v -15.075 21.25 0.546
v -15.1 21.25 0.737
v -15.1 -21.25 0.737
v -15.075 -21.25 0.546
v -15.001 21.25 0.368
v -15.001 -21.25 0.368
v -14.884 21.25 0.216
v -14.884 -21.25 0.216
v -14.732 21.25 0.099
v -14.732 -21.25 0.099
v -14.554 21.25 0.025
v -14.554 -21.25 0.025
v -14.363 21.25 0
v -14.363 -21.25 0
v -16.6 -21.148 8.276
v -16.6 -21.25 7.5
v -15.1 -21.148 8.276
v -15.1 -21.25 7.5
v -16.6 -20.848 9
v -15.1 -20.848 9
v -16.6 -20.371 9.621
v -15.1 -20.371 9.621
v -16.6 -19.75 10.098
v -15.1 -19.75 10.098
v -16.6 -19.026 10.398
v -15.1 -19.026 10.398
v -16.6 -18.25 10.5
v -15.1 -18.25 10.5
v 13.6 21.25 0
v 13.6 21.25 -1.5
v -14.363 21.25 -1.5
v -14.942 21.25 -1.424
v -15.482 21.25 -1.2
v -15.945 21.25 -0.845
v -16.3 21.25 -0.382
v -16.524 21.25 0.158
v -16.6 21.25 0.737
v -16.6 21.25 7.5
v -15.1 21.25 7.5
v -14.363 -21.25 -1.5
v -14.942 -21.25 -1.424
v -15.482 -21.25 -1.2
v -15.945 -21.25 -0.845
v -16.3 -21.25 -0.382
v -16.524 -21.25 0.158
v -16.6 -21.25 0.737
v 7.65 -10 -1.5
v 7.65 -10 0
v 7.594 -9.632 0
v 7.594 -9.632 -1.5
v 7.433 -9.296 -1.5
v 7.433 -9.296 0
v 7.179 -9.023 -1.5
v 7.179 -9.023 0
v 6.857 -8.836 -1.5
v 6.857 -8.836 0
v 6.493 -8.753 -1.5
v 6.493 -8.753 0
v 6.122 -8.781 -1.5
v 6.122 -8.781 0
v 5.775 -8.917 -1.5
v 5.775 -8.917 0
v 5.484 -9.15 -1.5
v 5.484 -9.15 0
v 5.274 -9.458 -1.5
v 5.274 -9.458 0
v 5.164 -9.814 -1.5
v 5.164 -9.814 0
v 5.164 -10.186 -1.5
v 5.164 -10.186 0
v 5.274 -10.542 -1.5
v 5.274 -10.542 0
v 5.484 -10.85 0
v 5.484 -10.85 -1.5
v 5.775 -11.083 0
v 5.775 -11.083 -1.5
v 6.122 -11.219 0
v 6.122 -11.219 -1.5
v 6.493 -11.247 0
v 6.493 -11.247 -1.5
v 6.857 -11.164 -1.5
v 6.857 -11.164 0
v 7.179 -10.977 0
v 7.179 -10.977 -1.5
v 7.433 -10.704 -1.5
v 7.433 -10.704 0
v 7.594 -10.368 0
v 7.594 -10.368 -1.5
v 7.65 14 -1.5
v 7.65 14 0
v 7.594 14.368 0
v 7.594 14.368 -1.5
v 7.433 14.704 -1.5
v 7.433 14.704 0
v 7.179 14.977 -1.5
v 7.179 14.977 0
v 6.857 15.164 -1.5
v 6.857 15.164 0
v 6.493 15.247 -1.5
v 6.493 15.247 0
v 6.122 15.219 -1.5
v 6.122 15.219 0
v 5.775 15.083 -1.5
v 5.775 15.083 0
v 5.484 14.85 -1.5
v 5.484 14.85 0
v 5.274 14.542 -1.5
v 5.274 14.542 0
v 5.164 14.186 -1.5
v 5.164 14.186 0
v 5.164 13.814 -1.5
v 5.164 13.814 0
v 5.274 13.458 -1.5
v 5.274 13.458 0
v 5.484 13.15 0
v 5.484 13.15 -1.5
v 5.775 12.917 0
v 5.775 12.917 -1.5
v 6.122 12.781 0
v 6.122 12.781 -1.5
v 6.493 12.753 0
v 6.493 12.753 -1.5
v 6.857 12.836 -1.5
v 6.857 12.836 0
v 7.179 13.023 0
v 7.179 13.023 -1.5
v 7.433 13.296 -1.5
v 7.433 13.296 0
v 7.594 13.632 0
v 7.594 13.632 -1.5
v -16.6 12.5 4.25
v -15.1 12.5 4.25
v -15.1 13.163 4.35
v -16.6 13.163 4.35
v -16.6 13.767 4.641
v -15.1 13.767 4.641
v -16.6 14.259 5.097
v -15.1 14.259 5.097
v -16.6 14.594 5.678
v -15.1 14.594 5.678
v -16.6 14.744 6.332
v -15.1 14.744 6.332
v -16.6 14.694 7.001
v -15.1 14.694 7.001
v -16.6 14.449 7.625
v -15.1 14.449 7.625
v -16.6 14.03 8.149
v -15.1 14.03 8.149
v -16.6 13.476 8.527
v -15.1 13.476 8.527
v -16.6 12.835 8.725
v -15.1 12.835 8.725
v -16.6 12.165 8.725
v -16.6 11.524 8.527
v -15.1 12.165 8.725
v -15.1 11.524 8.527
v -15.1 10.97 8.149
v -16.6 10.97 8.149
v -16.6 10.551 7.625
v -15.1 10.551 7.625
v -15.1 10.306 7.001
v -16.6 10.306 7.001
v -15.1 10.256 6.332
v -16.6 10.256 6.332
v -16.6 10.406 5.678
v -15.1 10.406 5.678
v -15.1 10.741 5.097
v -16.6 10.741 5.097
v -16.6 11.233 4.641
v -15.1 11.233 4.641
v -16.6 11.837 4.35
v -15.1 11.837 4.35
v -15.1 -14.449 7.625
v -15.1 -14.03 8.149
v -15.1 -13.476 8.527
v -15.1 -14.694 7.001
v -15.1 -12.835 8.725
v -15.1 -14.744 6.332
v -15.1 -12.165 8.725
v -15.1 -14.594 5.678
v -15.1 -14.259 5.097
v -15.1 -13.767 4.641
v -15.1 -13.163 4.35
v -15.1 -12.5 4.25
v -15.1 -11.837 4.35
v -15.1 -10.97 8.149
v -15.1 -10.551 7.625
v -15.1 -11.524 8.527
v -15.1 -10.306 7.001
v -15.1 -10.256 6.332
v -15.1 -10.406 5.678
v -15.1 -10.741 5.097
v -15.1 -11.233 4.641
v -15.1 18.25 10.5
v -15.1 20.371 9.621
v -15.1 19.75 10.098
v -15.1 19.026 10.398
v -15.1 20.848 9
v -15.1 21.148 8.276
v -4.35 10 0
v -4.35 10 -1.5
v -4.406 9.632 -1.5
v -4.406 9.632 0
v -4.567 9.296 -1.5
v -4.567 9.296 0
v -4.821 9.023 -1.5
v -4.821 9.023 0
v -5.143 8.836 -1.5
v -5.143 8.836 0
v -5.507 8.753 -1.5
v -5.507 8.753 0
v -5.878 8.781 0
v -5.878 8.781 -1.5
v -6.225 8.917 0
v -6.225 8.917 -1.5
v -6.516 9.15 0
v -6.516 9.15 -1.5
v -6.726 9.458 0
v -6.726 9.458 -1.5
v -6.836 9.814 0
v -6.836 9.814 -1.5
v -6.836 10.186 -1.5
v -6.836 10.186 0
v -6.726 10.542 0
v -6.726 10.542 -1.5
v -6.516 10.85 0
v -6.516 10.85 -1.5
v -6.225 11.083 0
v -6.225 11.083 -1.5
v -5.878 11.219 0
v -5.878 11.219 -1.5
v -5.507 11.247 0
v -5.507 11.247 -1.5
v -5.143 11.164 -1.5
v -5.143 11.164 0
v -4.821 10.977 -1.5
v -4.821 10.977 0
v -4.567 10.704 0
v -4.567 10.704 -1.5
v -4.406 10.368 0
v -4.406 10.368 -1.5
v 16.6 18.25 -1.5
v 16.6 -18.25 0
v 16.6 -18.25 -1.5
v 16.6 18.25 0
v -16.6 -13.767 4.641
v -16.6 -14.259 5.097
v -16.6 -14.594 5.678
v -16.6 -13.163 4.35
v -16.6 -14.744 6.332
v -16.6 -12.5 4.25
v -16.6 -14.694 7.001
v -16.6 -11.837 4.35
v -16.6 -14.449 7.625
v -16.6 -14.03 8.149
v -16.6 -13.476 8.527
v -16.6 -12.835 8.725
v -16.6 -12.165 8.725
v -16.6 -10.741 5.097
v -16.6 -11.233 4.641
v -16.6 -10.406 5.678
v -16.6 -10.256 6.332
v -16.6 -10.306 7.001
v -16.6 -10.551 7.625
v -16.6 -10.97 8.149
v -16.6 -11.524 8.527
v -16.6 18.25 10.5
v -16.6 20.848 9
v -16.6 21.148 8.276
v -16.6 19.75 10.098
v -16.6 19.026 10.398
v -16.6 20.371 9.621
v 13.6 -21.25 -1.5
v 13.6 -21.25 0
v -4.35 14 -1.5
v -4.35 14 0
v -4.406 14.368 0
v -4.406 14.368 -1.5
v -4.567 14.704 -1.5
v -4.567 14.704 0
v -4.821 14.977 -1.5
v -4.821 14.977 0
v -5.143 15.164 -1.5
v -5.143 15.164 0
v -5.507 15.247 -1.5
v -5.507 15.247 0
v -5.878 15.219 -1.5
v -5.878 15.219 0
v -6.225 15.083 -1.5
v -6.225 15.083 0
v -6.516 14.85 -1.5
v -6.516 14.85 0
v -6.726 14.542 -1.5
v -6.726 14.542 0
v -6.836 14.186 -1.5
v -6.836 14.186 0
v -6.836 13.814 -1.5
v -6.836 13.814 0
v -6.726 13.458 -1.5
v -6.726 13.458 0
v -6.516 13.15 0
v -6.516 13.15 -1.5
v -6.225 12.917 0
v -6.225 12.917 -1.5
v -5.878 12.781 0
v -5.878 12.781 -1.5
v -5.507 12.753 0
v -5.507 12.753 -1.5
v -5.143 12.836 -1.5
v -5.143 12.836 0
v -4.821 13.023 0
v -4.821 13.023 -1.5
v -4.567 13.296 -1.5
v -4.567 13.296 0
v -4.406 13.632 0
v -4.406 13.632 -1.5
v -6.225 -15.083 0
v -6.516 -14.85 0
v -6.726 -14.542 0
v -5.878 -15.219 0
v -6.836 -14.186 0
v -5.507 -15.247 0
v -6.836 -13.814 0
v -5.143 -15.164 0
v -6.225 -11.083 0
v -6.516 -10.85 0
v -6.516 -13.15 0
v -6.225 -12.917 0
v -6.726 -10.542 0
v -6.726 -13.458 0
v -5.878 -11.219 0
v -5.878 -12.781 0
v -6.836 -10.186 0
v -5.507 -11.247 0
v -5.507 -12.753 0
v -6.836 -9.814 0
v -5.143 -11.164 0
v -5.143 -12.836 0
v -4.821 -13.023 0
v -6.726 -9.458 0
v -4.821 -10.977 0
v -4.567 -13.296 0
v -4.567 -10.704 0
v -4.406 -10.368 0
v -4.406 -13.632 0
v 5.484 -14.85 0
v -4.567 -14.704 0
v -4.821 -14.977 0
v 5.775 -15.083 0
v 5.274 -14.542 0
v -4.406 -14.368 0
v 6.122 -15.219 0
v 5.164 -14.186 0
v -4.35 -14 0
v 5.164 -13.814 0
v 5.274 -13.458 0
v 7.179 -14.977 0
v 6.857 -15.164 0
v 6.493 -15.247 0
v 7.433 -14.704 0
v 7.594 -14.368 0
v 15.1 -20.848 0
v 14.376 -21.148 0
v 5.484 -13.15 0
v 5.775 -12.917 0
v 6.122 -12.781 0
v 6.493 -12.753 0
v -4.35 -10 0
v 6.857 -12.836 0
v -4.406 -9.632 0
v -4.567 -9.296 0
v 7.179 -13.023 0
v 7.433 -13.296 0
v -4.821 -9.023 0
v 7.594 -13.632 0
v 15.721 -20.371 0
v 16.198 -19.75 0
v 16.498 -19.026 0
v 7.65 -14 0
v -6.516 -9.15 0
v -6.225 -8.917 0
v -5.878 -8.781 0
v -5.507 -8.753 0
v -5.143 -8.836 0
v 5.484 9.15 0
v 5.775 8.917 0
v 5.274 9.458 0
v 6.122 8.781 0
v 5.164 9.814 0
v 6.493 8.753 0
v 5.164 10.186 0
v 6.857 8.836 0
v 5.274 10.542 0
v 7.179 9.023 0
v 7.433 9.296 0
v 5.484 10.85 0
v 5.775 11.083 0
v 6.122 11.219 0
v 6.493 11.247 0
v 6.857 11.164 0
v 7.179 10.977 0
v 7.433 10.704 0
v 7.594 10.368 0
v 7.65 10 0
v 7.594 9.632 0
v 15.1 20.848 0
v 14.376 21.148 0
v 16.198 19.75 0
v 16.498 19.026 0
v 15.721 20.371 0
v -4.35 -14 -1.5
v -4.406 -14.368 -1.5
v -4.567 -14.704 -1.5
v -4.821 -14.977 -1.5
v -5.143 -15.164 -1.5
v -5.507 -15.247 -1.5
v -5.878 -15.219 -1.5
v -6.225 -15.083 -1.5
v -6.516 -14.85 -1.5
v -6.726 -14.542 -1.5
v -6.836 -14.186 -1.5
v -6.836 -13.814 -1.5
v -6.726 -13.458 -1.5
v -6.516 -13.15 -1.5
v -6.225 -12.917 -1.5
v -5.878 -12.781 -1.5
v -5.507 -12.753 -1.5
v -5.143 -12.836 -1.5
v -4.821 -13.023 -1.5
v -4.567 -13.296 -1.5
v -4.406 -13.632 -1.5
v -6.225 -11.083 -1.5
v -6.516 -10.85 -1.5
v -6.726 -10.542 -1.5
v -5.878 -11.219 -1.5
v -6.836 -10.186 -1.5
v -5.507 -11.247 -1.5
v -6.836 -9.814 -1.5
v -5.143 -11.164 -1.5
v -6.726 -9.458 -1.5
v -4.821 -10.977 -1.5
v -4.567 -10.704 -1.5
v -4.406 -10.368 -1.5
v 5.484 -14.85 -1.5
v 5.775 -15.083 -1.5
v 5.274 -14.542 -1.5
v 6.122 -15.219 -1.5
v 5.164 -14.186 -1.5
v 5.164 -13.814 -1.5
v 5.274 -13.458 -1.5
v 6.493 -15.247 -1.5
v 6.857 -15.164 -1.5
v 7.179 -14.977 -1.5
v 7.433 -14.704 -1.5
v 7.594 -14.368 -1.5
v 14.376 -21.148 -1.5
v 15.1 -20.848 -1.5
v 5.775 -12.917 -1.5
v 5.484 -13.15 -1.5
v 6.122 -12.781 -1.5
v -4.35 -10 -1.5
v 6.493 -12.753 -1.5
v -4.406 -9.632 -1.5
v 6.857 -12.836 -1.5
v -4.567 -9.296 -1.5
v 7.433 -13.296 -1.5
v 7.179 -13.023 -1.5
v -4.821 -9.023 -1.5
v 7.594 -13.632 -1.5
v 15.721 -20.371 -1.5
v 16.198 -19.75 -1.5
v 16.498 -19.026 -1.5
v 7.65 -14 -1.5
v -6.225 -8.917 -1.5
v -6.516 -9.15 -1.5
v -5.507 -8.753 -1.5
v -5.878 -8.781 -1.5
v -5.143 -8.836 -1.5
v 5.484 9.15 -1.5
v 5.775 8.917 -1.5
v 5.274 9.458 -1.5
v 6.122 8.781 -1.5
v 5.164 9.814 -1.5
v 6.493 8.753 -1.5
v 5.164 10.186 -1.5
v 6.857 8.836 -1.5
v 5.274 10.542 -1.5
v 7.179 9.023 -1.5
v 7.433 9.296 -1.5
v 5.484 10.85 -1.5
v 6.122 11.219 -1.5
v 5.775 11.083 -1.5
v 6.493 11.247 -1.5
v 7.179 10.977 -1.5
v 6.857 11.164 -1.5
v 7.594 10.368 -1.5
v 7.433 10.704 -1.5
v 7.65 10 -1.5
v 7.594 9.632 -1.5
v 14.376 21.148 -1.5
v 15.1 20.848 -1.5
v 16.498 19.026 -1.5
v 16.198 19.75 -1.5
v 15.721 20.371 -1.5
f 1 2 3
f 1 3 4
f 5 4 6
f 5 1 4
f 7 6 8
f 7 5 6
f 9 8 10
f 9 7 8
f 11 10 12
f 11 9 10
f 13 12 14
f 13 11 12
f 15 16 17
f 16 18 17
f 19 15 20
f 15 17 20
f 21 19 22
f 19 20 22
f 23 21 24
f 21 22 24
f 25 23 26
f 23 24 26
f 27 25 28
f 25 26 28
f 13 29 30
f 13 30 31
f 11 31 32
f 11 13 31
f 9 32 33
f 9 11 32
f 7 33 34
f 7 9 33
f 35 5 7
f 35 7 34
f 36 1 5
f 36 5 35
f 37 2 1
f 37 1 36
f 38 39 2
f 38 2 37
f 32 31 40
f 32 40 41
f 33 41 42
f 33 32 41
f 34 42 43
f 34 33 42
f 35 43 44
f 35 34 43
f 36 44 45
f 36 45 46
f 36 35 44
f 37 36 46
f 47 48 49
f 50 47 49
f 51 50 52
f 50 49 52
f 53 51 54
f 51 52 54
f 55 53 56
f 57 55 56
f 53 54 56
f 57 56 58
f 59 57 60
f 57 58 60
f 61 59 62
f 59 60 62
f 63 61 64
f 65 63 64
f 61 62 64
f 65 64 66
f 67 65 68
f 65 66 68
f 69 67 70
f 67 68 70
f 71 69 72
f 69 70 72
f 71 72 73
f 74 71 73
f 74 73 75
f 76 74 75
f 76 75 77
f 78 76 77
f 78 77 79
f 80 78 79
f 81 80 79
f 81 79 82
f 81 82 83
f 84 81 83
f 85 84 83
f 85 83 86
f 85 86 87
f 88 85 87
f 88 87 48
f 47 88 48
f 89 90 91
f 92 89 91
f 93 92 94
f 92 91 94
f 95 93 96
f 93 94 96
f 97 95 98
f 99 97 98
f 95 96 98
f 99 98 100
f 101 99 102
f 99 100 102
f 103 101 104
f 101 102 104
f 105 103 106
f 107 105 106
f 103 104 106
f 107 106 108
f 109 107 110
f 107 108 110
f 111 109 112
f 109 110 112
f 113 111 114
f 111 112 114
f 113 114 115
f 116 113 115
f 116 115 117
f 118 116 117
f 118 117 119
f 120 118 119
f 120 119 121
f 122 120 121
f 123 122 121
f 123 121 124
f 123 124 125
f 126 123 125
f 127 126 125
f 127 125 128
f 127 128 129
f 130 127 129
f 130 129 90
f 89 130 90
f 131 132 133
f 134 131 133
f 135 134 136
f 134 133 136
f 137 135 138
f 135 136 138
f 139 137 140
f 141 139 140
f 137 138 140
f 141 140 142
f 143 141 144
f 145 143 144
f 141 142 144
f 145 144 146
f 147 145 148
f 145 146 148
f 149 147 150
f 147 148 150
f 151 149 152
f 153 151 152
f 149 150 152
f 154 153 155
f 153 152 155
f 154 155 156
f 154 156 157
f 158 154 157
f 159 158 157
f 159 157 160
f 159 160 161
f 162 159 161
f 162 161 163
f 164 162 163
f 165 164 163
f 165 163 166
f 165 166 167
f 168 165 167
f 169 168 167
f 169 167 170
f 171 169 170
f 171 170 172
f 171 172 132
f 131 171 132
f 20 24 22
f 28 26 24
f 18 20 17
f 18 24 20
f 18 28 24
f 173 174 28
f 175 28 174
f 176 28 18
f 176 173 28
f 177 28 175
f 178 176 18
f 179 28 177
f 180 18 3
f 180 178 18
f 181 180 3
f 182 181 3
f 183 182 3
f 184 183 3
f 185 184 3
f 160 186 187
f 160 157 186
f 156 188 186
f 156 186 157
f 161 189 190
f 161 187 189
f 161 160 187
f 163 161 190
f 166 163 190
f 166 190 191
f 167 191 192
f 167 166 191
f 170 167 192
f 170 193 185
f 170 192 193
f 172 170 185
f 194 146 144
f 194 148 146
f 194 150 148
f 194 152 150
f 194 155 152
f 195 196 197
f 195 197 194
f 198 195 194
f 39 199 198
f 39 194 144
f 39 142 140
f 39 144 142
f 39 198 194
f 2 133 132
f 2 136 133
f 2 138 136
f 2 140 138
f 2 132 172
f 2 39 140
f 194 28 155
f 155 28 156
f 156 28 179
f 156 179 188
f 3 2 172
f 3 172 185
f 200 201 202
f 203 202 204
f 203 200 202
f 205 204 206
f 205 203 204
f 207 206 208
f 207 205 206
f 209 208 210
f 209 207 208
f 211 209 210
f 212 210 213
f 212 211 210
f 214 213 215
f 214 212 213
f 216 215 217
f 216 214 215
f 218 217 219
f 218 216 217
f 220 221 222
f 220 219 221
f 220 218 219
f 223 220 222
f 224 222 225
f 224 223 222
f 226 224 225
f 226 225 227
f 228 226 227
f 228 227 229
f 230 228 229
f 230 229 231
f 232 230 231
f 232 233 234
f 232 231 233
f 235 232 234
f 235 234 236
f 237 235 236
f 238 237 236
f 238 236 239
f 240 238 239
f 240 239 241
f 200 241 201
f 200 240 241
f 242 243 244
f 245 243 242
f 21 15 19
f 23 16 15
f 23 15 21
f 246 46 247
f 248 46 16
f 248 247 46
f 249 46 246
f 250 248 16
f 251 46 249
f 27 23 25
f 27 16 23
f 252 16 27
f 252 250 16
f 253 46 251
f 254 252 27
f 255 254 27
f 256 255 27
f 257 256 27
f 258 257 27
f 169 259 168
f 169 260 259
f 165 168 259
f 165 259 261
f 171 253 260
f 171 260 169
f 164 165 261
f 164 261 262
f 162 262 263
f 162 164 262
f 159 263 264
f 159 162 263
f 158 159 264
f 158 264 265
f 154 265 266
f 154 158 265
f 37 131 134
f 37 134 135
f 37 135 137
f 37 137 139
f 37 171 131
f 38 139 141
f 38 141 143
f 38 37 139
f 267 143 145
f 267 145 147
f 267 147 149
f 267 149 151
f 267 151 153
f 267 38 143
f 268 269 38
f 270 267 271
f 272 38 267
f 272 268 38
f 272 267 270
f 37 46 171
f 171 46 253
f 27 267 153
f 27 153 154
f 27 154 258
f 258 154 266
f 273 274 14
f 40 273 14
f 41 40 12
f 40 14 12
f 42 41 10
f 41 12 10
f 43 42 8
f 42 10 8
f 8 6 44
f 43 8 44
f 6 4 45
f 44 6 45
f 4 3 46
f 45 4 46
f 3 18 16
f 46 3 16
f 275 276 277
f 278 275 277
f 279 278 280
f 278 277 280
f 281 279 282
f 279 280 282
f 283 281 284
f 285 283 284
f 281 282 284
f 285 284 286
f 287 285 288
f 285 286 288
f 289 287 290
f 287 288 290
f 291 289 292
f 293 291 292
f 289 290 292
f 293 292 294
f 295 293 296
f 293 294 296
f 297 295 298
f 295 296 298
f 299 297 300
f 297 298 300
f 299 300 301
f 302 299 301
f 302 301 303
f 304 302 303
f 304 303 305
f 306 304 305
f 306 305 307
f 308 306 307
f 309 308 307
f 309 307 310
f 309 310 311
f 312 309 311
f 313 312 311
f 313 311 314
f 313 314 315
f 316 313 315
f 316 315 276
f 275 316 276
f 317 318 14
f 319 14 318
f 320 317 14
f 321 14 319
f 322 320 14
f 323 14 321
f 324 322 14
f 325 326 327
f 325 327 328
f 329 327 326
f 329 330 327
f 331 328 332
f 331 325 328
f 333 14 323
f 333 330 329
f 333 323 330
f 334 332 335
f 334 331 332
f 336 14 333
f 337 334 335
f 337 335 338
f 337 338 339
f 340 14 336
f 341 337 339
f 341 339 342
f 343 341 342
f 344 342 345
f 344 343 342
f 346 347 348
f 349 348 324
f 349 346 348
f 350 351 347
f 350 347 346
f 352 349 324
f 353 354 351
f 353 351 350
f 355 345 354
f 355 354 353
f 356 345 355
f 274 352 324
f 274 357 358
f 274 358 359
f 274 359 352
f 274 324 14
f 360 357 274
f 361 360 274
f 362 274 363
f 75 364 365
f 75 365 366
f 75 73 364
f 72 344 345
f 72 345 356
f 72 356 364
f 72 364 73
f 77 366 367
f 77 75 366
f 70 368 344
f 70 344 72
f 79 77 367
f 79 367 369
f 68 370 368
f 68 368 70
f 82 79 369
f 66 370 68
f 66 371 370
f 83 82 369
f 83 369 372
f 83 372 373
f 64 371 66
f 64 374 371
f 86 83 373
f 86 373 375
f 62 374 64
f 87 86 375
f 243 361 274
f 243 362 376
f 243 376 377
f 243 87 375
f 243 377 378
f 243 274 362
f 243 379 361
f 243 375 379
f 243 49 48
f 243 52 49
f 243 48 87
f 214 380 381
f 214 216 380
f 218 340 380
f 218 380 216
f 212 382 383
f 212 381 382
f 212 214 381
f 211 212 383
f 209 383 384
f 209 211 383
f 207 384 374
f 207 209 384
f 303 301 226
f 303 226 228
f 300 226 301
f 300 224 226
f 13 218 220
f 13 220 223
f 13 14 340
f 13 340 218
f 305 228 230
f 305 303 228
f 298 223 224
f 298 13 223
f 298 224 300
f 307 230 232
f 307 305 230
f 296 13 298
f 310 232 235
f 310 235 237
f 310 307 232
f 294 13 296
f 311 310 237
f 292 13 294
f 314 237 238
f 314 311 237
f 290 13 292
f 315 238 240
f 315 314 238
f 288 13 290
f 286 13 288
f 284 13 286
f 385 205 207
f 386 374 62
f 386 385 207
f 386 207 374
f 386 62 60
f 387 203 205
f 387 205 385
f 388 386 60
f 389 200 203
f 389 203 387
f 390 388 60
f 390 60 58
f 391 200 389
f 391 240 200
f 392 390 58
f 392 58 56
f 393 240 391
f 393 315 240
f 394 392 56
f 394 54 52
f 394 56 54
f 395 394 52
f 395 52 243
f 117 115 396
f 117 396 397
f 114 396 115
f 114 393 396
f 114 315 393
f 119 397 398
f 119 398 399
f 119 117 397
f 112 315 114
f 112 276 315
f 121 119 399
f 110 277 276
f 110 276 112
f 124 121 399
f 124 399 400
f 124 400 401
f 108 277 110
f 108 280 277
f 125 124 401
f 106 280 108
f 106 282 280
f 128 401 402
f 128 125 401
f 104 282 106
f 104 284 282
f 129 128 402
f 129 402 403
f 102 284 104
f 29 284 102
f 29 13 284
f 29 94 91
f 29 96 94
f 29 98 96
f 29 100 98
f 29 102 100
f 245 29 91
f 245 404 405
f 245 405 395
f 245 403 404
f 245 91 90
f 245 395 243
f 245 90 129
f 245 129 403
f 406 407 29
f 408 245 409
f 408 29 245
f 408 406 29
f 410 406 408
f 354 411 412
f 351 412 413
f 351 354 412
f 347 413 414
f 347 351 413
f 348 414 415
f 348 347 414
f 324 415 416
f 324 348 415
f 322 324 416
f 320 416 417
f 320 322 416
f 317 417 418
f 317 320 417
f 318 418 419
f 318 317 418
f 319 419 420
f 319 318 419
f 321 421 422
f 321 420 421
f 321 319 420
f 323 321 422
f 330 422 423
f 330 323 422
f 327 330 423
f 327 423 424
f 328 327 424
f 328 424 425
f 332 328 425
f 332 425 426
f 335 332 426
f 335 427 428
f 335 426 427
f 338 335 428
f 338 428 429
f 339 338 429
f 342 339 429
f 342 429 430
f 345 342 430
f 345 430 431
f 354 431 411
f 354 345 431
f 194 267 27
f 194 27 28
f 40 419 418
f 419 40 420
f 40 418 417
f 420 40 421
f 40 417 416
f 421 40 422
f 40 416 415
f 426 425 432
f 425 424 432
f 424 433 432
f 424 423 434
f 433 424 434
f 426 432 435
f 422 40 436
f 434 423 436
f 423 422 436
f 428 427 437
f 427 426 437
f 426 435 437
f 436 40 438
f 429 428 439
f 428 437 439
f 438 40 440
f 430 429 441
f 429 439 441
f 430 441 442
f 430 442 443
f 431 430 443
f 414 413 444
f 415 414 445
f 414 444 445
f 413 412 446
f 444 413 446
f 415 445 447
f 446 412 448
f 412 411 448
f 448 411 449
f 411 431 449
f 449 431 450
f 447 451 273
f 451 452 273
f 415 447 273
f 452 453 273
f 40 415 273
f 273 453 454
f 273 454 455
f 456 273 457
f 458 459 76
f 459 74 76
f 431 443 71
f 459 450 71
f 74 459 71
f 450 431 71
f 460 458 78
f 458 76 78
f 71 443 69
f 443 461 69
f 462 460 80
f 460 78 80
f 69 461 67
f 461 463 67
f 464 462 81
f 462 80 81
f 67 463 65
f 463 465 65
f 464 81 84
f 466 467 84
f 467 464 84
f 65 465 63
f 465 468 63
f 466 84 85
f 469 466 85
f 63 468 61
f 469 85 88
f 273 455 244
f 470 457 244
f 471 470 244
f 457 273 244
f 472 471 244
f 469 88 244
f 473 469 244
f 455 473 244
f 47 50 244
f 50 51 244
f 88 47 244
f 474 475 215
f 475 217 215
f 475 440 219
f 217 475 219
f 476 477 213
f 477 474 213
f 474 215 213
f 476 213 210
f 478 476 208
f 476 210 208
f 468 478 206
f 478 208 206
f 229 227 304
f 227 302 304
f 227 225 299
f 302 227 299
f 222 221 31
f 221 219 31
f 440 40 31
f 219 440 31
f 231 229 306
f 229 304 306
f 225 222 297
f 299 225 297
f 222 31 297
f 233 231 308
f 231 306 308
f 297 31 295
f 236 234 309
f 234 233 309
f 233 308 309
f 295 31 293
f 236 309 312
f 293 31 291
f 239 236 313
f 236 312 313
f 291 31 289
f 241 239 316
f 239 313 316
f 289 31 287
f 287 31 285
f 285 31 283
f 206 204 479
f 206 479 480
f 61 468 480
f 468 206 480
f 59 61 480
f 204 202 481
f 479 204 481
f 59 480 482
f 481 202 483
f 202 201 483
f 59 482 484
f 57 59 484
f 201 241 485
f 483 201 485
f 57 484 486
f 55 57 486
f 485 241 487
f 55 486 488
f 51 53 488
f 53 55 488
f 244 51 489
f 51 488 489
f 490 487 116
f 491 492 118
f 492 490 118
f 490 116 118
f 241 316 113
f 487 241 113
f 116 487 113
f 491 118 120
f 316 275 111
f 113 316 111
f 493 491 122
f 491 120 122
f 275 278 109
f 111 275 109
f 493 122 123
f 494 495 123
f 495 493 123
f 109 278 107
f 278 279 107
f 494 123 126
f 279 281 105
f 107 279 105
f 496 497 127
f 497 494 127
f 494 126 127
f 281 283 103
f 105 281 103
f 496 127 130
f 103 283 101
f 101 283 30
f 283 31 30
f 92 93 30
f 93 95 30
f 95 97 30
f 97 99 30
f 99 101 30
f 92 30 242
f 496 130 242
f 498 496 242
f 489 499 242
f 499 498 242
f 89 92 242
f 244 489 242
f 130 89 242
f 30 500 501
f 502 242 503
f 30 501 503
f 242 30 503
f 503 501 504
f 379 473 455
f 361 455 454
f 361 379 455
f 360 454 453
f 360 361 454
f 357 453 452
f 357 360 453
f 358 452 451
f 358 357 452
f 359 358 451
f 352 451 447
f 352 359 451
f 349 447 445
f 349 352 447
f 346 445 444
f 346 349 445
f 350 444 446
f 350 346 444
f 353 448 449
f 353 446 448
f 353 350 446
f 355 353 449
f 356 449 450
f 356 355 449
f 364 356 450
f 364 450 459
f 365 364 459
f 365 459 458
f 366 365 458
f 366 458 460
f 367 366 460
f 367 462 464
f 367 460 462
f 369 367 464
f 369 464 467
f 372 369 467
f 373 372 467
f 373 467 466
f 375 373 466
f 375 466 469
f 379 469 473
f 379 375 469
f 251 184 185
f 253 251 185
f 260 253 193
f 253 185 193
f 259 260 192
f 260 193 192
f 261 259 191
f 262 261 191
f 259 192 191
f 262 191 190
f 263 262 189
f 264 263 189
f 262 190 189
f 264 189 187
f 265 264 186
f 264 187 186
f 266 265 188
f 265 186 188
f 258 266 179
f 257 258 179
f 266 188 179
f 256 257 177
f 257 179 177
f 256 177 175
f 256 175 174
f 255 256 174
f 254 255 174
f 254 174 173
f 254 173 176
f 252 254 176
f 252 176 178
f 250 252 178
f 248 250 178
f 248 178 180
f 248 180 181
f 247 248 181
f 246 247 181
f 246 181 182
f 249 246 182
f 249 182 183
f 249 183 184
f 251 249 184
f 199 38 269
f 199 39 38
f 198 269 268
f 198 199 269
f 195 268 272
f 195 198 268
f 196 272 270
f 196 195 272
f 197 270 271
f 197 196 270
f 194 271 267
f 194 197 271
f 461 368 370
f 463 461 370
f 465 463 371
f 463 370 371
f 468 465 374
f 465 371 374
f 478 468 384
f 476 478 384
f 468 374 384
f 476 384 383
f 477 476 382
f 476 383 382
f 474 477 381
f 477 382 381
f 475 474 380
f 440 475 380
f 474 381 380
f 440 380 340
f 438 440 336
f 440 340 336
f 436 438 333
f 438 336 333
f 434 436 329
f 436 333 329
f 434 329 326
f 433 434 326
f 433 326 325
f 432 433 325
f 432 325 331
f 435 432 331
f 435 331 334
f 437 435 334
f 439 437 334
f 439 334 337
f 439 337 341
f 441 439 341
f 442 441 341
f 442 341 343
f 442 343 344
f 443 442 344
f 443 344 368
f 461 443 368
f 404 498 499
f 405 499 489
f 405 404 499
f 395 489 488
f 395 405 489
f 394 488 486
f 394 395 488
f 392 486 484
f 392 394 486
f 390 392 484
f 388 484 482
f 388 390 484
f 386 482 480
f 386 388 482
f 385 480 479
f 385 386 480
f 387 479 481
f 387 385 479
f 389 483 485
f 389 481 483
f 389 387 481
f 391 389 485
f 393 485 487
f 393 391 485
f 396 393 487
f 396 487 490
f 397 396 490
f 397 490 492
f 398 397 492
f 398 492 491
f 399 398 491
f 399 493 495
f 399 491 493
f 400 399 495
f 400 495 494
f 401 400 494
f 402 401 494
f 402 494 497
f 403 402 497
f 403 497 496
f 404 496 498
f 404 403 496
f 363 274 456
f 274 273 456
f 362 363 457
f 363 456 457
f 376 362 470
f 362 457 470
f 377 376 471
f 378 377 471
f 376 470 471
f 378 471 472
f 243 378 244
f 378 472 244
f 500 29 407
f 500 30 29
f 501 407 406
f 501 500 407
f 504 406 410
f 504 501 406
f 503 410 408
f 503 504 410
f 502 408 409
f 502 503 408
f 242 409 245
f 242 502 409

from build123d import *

# Parameters (mm, degrees)
SKETCH_1_W                       = 33.2
SKETCH_1_H                       = 42.5
SM_BASE_FLANGE_1_DEPTH           = 1.5
SM_EDGE_FLANGE_1_STRIP_W         = 7.4732
SM_EDGE_FLANGE_1_STRIP_H         = 1.5
SM_EDGE_FLANGE_1_STRIP_CUT_DEPTH = 42.5
SM_EDGE_FLANGE_1_DEPTH           = 42.5
SKETCH_9_R                       = 1.25
CUT_EXTRUDE_1_DEPTH              = 10
SKETCH_10_R                      = 2.25
CUT_EXTRUDE_2_DEPTH              = 10
FILLET_1_R                       = 3


# Sheet-metal steps are written as plain solids
with BuildPart() as part:
    # Sketch 1 → 基体-法兰1 (new body)
    with BuildSketch(Plane.XY):
        Rectangle(SKETCH_1_W, SKETCH_1_H)
    extrude(amount=-SM_BASE_FLANGE_1_DEPTH)

    # 边线-法兰1 strip (across the edge) → 边线-法兰1 strip cut (cut)
    with BuildSketch(Plane(origin=(-16.6, 21.25, 0), x_dir=(1, 0, 0), z_dir=(0, -1, 0))):
        with Locations((-1.5, -0.75)):
            Rectangle(SM_EDGE_FLANGE_1_STRIP_W, SM_EDGE_FLANGE_1_STRIP_H)
    extrude(amount=SM_EDGE_FLANGE_1_STRIP_CUT_DEPTH, mode=Mode.SUBTRACT)

    # 边线-法兰1 section (across the edge) → 边线-法兰1 (add)
    with BuildSketch(Plane(origin=(-16.6, 21.25, 0), x_dir=(1, 0, 0), z_dir=(0, -1, 0))):
        with BuildLine():
            Line((0, 0.7366), (0, 10.5))
            Line((0, 10.5), (1.5, 10.5))
            Line((1.5, 10.5), (1.5, 0.7366))
            ThreePointArc((1.5, 0.7366), (1.715745145, 0.215745145), (2.2366, 0))
            Line((2.2366, 0), (2.2366, -1.5))
            ThreePointArc((2.2366, -1.5), (0.655084973, -0.844915027), (0, 0.7366))
        make_face()
    extrude(amount=SM_EDGE_FLANGE_1_DEPTH)

    # 草图9 → 切除-拉伸1 (cut)
    with BuildSketch(Plane.XY):
        with Locations((6.4, 14)):
            Circle(SKETCH_9_R)
        with Locations((-5.6, 14)):
            Circle(SKETCH_9_R)
        with Locations((6.4, -10)):
            Circle(SKETCH_9_R)
        with Locations((-5.6, -10)):
            Circle(SKETCH_9_R)
    cut_extrude_1 = extrude(amount=-CUT_EXTRUDE_1_DEPTH, mode=Mode.SUBTRACT)

    # 草图10 → 切除-拉伸2 (cut)
    with BuildSketch(Plane(origin=(-15.1, 0, 0), x_dir=(0, 0, -1), z_dir=(1, 0, 0))):
        with Locations((-6.5, 12.5)):
            Circle(SKETCH_10_R)
        with Locations((-6.5, -12.5)):
            Circle(SKETCH_10_R)
    extrude(amount=-CUT_EXTRUDE_2_DEPTH, mode=Mode.SUBTRACT)

    # 镜向1: 切除-拉伸1 across plane
    add(cut_extrude_1.mirror(Plane.ZX), mode=Mode.SUBTRACT)

    # 圆角1
    fillet_1_edges = [part.edges().sort_by_distance(p)[0] for p in [
        (-15.85, 21.25, 10.5),
        (-15.85, -21.25, 10.5),
        (16.6, 21.25, -0.75),
        (16.6, -21.25, -0.75),
    ]]
    fillet(fillet_1_edges, radius=FILLET_1_R)


solid = part.part
